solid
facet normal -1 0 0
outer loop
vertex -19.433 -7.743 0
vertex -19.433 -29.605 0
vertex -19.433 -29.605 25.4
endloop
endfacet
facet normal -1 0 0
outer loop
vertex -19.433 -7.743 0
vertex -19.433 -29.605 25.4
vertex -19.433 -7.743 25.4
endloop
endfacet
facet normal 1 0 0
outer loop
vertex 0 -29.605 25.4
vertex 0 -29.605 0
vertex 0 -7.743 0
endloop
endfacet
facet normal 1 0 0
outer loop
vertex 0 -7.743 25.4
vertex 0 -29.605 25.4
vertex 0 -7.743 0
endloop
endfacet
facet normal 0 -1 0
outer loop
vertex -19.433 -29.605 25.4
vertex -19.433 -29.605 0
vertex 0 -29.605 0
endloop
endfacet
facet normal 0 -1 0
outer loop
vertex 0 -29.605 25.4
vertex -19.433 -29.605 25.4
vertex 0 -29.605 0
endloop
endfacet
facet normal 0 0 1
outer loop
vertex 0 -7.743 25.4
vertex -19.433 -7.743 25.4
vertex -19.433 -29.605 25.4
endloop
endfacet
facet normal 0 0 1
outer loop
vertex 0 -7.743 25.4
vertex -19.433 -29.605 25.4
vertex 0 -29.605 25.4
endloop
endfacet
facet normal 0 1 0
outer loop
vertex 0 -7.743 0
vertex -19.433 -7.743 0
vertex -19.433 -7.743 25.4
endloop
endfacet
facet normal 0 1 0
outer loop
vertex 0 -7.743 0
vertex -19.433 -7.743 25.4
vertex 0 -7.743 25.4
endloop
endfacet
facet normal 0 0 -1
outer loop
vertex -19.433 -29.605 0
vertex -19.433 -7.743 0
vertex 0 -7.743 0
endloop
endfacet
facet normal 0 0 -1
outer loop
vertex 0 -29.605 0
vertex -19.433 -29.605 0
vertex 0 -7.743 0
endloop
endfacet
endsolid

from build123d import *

# Parameters (mm, degrees)
F0_W     = 39.1732295975
F0_H     = 34.004369285
F1_DEPTH = 25.4
F3_W     = 19.4331686944
F3_H     = 21.8623159453
F4_DEPTH = 25.4


with BuildPart() as f1:
    # F0 (on Top) → F1 (new body)
    with BuildSketch(Plane.XY):
        with Locations((-31.1264027841, 23.8298953045)):
            Rectangle(F0_W, F0_H)
    extrude(amount=F1_DEPTH)


with BuildPart() as f4:
    # F3 (on Top) → F4 (new body)
    with BuildSketch(Plane.XY):
        with Locations((-9.7165843472, -18.674061168)):
            Rectangle(F3_W, F3_H)
    extrude(amount=F4_DEPTH)


solid = f4.part
